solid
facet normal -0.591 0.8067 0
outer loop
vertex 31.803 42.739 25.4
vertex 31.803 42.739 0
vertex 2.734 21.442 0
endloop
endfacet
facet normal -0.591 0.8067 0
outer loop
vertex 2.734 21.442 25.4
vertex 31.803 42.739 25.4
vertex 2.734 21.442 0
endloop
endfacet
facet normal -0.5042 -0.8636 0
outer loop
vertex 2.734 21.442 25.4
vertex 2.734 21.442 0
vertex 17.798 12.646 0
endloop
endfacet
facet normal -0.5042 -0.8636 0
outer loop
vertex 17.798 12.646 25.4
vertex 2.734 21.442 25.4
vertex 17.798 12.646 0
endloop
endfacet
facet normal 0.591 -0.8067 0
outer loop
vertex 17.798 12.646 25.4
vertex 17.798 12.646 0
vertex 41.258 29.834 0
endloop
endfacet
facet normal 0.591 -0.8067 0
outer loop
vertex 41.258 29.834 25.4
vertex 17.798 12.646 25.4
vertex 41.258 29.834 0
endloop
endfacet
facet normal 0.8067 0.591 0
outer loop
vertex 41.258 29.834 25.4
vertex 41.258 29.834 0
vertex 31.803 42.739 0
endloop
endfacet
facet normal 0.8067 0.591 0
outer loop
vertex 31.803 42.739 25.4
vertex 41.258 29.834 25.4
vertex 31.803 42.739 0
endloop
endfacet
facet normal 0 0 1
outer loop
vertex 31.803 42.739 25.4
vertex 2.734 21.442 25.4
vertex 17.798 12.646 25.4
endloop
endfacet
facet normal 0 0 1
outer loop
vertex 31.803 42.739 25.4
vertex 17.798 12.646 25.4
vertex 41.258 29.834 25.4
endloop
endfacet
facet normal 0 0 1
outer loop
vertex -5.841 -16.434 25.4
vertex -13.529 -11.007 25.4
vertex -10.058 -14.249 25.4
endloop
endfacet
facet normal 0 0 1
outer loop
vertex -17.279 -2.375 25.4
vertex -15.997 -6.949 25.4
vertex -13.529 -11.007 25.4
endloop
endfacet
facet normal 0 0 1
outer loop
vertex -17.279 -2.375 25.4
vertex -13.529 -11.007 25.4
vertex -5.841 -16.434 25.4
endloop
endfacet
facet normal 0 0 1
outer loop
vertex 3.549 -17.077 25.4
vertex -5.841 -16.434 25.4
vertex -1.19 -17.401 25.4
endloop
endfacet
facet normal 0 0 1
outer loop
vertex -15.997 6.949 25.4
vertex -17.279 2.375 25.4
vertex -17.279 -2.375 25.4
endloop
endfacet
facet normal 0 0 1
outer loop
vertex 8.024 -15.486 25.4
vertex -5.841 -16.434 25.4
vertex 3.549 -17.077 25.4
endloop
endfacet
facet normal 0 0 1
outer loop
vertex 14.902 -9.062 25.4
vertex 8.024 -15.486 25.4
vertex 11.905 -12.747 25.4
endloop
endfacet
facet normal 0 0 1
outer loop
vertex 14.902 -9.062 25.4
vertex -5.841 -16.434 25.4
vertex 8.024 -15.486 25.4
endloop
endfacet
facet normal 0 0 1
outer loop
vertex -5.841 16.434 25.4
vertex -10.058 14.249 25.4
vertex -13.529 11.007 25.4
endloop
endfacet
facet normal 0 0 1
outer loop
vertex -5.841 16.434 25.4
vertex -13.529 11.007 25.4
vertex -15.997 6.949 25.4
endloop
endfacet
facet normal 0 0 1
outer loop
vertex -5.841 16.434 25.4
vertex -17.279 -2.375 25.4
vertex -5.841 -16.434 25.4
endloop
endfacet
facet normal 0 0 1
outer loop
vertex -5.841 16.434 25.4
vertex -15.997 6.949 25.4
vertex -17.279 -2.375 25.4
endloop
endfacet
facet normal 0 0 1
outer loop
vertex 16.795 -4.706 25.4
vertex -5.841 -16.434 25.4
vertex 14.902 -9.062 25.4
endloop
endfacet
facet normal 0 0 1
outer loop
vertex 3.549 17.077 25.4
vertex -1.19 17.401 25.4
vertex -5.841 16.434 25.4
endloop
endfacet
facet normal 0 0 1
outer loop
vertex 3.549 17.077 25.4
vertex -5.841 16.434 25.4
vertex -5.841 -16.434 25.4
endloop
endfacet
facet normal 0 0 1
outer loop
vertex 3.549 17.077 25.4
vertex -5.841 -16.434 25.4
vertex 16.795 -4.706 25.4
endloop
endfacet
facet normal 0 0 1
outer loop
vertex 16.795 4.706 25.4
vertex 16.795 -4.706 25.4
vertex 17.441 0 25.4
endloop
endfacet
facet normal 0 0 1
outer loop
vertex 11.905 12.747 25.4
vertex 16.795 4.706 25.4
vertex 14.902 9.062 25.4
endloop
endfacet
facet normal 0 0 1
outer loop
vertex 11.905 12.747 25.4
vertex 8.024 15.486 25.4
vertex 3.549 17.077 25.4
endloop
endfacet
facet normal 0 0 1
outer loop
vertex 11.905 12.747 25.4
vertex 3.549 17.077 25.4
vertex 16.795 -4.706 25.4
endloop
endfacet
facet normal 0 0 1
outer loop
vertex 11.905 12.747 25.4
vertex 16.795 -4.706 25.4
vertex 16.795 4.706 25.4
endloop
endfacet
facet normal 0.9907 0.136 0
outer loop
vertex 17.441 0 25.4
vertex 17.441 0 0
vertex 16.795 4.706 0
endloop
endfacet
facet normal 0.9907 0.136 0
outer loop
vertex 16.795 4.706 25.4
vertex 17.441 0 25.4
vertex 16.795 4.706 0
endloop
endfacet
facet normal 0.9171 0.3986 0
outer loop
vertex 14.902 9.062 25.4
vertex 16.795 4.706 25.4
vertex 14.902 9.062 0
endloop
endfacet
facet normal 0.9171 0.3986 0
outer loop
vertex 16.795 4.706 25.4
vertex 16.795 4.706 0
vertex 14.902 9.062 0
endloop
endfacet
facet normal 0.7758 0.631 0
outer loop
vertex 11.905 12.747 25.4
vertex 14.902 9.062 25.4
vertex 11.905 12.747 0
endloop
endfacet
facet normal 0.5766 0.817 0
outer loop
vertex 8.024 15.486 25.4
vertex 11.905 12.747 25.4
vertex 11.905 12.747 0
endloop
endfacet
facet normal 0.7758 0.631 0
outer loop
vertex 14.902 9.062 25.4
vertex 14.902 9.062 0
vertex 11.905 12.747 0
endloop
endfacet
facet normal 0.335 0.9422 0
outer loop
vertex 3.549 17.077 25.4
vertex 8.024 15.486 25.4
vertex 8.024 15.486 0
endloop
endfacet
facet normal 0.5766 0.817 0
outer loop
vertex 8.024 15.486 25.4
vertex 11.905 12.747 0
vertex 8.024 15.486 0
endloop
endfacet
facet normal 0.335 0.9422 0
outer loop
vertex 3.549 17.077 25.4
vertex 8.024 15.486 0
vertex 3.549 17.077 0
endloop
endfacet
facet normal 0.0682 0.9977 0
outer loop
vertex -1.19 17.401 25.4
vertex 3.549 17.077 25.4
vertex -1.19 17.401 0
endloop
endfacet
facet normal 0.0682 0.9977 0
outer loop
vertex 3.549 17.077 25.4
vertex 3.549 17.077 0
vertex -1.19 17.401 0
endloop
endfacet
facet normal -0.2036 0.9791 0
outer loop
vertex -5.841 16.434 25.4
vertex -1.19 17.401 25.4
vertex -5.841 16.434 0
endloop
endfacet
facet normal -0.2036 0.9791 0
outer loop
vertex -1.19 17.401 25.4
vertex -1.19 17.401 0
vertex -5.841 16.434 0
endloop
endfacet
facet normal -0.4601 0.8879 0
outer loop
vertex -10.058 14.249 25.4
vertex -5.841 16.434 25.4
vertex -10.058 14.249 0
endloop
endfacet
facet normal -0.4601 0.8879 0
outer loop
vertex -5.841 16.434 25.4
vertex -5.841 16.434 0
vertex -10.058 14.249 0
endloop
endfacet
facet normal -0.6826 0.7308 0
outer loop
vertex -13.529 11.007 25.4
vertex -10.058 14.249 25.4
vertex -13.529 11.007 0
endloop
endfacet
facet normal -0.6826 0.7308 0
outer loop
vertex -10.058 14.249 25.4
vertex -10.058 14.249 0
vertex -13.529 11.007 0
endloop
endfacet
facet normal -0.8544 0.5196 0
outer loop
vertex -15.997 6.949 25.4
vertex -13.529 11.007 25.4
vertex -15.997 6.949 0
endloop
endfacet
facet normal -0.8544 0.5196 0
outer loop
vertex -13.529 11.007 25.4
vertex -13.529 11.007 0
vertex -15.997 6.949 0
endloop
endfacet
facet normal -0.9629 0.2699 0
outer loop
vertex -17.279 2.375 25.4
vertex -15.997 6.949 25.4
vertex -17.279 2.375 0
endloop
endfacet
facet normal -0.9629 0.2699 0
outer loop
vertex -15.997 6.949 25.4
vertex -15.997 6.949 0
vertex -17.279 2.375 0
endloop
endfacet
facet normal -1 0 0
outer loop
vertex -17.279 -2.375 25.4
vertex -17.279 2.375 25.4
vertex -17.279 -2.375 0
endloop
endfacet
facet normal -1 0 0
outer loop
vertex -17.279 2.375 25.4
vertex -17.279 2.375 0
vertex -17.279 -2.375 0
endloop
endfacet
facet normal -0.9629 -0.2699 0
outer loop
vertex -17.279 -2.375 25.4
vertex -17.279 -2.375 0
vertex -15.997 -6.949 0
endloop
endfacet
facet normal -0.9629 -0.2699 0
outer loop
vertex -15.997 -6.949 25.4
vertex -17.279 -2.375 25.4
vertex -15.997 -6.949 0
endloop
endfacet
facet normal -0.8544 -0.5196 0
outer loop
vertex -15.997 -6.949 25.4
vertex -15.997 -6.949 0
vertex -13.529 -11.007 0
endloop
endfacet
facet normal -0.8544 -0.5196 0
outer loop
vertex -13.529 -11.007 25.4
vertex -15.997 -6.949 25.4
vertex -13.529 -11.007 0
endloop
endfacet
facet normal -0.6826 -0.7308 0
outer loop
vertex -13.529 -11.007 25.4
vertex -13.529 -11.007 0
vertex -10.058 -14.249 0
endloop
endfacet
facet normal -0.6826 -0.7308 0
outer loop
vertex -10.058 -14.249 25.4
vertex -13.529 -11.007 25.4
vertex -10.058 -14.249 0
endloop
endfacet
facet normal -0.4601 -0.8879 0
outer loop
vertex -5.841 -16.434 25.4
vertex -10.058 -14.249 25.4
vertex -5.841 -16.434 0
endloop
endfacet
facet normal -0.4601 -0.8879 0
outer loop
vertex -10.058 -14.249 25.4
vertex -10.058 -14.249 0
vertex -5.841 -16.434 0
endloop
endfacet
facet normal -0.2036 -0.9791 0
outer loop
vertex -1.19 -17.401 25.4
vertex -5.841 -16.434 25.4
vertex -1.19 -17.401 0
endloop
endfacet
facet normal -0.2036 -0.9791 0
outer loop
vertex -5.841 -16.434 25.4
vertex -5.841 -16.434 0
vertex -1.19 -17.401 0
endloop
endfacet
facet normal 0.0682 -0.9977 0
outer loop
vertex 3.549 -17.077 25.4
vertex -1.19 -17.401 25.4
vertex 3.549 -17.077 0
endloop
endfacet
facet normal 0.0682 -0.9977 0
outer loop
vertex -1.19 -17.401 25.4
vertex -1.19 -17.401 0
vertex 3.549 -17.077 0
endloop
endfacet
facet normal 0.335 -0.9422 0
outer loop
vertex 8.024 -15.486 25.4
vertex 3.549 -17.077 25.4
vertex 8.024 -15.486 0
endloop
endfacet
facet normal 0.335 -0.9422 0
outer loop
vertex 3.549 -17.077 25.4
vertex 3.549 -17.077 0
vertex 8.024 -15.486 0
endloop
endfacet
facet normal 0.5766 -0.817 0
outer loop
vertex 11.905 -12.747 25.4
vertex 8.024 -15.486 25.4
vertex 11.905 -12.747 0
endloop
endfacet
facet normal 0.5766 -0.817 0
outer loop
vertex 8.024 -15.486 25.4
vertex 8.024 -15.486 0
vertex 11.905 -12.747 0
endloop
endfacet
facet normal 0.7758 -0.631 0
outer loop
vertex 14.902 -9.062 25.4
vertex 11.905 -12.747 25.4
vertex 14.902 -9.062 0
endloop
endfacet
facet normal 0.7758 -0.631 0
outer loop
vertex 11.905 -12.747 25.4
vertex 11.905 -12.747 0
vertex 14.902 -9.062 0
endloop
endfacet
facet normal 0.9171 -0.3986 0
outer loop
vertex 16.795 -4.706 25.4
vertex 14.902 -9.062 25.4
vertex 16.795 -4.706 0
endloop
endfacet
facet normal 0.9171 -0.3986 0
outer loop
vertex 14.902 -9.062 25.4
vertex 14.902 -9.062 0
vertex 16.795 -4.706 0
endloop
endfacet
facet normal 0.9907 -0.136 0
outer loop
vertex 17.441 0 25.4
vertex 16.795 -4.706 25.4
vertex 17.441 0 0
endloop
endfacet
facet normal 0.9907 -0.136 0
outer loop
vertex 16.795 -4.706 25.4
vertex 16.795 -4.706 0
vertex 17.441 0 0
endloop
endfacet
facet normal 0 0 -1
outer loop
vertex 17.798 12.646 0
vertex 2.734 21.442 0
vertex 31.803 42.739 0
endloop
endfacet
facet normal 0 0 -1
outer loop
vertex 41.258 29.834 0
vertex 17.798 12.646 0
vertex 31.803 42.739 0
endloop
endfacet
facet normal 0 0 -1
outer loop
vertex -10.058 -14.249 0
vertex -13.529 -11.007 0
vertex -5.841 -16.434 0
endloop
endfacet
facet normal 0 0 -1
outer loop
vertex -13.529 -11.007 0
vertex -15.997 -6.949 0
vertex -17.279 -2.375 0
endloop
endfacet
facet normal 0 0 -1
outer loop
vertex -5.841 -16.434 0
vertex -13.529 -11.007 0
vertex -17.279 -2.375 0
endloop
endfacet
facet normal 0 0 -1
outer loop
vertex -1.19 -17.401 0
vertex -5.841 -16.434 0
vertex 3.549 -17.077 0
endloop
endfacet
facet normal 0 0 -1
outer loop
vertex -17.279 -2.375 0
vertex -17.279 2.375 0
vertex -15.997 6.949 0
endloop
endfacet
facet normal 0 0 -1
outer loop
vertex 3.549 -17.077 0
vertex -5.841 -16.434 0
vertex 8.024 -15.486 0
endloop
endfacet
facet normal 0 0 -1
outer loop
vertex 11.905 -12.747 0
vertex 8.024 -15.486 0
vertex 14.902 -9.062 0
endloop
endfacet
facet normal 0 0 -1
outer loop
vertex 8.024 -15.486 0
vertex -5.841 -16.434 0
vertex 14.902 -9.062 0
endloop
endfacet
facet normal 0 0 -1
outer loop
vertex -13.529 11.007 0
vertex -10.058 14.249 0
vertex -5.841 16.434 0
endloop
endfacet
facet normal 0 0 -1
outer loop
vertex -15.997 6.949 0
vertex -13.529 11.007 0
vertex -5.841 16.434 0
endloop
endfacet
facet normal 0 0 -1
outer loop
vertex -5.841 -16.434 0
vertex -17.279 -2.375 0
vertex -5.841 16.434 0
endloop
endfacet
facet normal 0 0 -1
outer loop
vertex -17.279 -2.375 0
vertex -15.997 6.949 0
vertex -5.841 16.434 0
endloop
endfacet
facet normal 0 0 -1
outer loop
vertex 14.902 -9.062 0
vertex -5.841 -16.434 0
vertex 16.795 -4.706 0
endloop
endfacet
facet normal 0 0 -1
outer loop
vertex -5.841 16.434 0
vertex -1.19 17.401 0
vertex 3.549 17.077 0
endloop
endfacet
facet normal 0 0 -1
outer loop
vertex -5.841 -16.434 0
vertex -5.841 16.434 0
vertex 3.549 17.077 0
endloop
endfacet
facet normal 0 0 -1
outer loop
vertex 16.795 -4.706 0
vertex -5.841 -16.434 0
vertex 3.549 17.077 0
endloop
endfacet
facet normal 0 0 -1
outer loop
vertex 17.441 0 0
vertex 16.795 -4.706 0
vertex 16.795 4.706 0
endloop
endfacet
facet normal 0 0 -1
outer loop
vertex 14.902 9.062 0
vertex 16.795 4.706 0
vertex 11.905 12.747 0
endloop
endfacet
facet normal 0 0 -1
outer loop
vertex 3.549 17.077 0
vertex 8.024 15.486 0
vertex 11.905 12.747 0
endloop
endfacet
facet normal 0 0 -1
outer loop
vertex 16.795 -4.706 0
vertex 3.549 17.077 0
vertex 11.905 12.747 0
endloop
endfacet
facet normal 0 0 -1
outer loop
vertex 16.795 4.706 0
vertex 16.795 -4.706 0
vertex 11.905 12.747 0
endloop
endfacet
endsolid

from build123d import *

# Parameters (mm, degrees)
F0_R     = 17.441362
F1_DEPTH = 25.4


with BuildPart() as f1:
    # F0 (on Top) → F1 (new body)
    with BuildSketch(Plane.XY):
        Circle(F0_R)
        Polygon((31.802539, 42.739153), (2.734156, 21.441529), (17.798473, 12.645803), (41.257883, 29.833884), align=None)
    extrude(amount=F1_DEPTH)


solid = f1.part
